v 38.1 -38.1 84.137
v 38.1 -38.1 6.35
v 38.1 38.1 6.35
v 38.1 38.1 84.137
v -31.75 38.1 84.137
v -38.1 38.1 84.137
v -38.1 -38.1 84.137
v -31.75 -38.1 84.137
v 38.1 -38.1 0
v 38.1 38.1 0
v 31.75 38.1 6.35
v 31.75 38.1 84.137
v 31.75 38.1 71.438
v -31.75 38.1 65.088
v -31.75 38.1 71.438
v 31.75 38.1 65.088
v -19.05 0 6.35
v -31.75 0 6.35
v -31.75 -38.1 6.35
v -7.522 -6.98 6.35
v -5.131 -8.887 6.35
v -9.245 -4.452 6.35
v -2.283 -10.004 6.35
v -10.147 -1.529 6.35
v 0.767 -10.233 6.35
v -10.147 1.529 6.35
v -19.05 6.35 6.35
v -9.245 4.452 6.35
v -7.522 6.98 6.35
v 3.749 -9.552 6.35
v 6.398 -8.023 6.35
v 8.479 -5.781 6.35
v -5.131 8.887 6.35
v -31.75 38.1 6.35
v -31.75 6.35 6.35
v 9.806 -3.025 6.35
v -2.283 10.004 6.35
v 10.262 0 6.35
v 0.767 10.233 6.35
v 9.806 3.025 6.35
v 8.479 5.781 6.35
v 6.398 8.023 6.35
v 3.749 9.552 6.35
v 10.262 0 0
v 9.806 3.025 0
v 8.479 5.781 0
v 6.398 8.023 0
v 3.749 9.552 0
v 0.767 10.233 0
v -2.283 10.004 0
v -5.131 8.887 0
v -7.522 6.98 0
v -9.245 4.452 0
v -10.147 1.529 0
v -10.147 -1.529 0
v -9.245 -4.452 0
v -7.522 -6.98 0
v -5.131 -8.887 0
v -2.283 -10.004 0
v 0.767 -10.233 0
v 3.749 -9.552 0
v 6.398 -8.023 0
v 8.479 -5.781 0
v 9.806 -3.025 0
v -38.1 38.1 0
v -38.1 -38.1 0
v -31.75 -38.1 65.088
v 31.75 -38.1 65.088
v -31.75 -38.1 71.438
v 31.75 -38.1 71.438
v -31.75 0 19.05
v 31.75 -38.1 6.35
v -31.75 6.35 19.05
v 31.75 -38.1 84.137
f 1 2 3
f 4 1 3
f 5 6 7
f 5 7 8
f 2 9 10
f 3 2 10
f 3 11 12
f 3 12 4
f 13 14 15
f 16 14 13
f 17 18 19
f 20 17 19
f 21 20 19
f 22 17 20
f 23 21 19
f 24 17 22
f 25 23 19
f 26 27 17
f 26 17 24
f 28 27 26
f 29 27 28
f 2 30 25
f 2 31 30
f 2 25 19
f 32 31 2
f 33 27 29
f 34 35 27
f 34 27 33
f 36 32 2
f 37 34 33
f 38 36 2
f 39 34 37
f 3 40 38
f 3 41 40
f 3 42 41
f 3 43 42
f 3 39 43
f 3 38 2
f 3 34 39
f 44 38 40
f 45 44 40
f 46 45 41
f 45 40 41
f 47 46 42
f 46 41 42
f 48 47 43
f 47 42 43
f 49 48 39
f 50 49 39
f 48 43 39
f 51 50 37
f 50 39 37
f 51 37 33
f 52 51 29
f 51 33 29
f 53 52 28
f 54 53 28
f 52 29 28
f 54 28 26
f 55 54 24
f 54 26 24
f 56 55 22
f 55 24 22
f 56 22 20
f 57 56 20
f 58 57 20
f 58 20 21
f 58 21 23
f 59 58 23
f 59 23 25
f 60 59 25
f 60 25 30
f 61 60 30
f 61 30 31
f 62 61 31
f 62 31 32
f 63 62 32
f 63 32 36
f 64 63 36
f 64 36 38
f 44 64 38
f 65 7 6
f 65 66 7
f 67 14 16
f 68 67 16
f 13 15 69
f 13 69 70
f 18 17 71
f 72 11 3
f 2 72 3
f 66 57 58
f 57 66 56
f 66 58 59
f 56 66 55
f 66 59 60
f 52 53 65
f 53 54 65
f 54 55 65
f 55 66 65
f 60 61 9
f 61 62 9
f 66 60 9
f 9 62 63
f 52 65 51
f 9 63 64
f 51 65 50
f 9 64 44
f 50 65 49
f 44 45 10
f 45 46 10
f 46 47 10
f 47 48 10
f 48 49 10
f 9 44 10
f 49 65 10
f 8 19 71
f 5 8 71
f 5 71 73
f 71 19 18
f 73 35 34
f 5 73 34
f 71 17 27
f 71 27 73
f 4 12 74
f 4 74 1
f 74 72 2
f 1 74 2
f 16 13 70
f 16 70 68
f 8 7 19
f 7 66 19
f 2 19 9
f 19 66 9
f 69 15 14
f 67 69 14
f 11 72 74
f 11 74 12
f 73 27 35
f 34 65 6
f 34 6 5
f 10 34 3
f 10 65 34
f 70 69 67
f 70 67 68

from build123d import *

# Parameters (mm, degrees)
SKETCH1_W                       = 76.2
SKETCH1_H                       = 76.2
BOSS_EXTRUDE1_DEPTH             = 6.35
SKETCH2_W                       = 6.35
SKETCH2_H                       = 76.2
BOSS_EXTRUDE2_DEPTH             = 77.7875
BOSS_EXTRUDE2_2_DEPTH           = 77.7875
SKETCH3_R                       = 10.2616
CUT_EXTRUDE1_DEPTH              = 95.626186419
BOSS_EXTRUDE3_REACH             = 101.912
SKETCH4_W                       = 63.5
SKETCH4_H                       = 6.35
BOSS_EXTRUDE3_DIRECTION_2_REACH = 101.912
BOSS_EXTRUDE4_DEPTH             = 6.35


with BuildPart() as part:
    # Sketch1 → Boss-Extrude1 (new body)
    with BuildSketch(Plane.XY):
        Rectangle(SKETCH1_W, SKETCH1_H)
    extrude(amount=BOSS_EXTRUDE1_DEPTH)

    # Sketch3 → Cut-Extrude1 (cut, through all)
    with BuildSketch(Plane.XY.offset(6.35)):
        Circle(SKETCH3_R)
    extrude(amount=-CUT_EXTRUDE1_DEPTH, mode=Mode.SUBTRACT)



with BuildPart() as body_2:
    # Sketch2 → Boss-Extrude2 (new body)
    with BuildSketch(Plane.XY.offset(6.35)):
        with Locations((-34.925, 0)):
            Rectangle(SKETCH2_W, SKETCH2_H)
    extrude(amount=BOSS_EXTRUDE2_DEPTH)


with BuildPart() as body_3:
    # Sketch2 → Boss-Extrude2 2 (new body)
    with BuildSketch(Plane.XY.offset(6.35)):
        with Locations((34.925, 0)):
            Rectangle(SKETCH2_W, SKETCH2_H)
    extrude(amount=BOSS_EXTRUDE2_2_DEPTH)


with BuildPart() as body_4:

    # Boss-Extrude3: up to this face of the body (flat: up to its plane)
    boss_extrude3_end = Plane(body_2.part.faces().sort_by_distance((-34.925, 38.1, 45.24375))[0])
    # Sketch4 → Boss-Extrude3 (new, up to the picked face)
    with BuildSketch(Plane(origin=(0, 0, 0), x_dir=(1, 0, 0), z_dir=(0, 1, 0)), mode=Mode.PRIVATE) as boss_extrude3_sk1:
        with Locations((0, -68.2625)):
            Rectangle(SKETCH4_W, SKETCH4_H)
    boss_extrude3_tool1 = split(extrude(boss_extrude3_sk1.sketch, amount=BOSS_EXTRUDE3_REACH, mode=Mode.PRIVATE), bisect_by=boss_extrude3_end, keep=Keep.BOTH, mode=Mode.PRIVATE)
    add(boss_extrude3_tool1.solids().sort_by(Axis((0, 0, 68.2625), (0, 1, 0)))[0])


    # Boss-Extrude3 direction 2: up to this face of the body (flat: up to its plane)
    boss_extrude3_direction_2_end = Plane(body_2.part.faces().sort_by_distance((-34.925, -38.1, 45.24375))[0])
    # Sketch4 → Boss-Extrude3 direction 2 (add, up to the picked face)
    with BuildSketch(Plane(origin=(0, 0, 0), x_dir=(1, 0, 0), z_dir=(0, 1, 0)), mode=Mode.PRIVATE) as boss_extrude3_direction_2_sk1:
        with Locations((0, -68.2625)):
            Rectangle(SKETCH4_W, SKETCH4_H)
    boss_extrude3_direction_2_tool1 = split(extrude(boss_extrude3_direction_2_sk1.sketch, amount=-BOSS_EXTRUDE3_DIRECTION_2_REACH, mode=Mode.PRIVATE), bisect_by=boss_extrude3_direction_2_end, keep=Keep.BOTH, mode=Mode.PRIVATE)
    add(boss_extrude3_direction_2_tool1.solids().sort_by(Axis((0, 0, 68.2625), (0, -1, 0)))[0])


with BuildPart() as part_1:
    add(part.part)

    add(body_2.part)  # Boss-Extrude4 merges body 2
    # Sketch5 → Boss-Extrude4 (add)
    with BuildSketch(Plane(origin=(0, 0, 0), x_dir=(1, 0, 0), z_dir=(0, 1, 0))):
        Polygon((-19.05, -6.35), (-31.75, -19.05), (-31.75, -6.35), align=None)
    extrude(amount=BOSS_EXTRUDE4_DEPTH)


solid = Compound([body_3.part, body_4.part, part_1.part])
